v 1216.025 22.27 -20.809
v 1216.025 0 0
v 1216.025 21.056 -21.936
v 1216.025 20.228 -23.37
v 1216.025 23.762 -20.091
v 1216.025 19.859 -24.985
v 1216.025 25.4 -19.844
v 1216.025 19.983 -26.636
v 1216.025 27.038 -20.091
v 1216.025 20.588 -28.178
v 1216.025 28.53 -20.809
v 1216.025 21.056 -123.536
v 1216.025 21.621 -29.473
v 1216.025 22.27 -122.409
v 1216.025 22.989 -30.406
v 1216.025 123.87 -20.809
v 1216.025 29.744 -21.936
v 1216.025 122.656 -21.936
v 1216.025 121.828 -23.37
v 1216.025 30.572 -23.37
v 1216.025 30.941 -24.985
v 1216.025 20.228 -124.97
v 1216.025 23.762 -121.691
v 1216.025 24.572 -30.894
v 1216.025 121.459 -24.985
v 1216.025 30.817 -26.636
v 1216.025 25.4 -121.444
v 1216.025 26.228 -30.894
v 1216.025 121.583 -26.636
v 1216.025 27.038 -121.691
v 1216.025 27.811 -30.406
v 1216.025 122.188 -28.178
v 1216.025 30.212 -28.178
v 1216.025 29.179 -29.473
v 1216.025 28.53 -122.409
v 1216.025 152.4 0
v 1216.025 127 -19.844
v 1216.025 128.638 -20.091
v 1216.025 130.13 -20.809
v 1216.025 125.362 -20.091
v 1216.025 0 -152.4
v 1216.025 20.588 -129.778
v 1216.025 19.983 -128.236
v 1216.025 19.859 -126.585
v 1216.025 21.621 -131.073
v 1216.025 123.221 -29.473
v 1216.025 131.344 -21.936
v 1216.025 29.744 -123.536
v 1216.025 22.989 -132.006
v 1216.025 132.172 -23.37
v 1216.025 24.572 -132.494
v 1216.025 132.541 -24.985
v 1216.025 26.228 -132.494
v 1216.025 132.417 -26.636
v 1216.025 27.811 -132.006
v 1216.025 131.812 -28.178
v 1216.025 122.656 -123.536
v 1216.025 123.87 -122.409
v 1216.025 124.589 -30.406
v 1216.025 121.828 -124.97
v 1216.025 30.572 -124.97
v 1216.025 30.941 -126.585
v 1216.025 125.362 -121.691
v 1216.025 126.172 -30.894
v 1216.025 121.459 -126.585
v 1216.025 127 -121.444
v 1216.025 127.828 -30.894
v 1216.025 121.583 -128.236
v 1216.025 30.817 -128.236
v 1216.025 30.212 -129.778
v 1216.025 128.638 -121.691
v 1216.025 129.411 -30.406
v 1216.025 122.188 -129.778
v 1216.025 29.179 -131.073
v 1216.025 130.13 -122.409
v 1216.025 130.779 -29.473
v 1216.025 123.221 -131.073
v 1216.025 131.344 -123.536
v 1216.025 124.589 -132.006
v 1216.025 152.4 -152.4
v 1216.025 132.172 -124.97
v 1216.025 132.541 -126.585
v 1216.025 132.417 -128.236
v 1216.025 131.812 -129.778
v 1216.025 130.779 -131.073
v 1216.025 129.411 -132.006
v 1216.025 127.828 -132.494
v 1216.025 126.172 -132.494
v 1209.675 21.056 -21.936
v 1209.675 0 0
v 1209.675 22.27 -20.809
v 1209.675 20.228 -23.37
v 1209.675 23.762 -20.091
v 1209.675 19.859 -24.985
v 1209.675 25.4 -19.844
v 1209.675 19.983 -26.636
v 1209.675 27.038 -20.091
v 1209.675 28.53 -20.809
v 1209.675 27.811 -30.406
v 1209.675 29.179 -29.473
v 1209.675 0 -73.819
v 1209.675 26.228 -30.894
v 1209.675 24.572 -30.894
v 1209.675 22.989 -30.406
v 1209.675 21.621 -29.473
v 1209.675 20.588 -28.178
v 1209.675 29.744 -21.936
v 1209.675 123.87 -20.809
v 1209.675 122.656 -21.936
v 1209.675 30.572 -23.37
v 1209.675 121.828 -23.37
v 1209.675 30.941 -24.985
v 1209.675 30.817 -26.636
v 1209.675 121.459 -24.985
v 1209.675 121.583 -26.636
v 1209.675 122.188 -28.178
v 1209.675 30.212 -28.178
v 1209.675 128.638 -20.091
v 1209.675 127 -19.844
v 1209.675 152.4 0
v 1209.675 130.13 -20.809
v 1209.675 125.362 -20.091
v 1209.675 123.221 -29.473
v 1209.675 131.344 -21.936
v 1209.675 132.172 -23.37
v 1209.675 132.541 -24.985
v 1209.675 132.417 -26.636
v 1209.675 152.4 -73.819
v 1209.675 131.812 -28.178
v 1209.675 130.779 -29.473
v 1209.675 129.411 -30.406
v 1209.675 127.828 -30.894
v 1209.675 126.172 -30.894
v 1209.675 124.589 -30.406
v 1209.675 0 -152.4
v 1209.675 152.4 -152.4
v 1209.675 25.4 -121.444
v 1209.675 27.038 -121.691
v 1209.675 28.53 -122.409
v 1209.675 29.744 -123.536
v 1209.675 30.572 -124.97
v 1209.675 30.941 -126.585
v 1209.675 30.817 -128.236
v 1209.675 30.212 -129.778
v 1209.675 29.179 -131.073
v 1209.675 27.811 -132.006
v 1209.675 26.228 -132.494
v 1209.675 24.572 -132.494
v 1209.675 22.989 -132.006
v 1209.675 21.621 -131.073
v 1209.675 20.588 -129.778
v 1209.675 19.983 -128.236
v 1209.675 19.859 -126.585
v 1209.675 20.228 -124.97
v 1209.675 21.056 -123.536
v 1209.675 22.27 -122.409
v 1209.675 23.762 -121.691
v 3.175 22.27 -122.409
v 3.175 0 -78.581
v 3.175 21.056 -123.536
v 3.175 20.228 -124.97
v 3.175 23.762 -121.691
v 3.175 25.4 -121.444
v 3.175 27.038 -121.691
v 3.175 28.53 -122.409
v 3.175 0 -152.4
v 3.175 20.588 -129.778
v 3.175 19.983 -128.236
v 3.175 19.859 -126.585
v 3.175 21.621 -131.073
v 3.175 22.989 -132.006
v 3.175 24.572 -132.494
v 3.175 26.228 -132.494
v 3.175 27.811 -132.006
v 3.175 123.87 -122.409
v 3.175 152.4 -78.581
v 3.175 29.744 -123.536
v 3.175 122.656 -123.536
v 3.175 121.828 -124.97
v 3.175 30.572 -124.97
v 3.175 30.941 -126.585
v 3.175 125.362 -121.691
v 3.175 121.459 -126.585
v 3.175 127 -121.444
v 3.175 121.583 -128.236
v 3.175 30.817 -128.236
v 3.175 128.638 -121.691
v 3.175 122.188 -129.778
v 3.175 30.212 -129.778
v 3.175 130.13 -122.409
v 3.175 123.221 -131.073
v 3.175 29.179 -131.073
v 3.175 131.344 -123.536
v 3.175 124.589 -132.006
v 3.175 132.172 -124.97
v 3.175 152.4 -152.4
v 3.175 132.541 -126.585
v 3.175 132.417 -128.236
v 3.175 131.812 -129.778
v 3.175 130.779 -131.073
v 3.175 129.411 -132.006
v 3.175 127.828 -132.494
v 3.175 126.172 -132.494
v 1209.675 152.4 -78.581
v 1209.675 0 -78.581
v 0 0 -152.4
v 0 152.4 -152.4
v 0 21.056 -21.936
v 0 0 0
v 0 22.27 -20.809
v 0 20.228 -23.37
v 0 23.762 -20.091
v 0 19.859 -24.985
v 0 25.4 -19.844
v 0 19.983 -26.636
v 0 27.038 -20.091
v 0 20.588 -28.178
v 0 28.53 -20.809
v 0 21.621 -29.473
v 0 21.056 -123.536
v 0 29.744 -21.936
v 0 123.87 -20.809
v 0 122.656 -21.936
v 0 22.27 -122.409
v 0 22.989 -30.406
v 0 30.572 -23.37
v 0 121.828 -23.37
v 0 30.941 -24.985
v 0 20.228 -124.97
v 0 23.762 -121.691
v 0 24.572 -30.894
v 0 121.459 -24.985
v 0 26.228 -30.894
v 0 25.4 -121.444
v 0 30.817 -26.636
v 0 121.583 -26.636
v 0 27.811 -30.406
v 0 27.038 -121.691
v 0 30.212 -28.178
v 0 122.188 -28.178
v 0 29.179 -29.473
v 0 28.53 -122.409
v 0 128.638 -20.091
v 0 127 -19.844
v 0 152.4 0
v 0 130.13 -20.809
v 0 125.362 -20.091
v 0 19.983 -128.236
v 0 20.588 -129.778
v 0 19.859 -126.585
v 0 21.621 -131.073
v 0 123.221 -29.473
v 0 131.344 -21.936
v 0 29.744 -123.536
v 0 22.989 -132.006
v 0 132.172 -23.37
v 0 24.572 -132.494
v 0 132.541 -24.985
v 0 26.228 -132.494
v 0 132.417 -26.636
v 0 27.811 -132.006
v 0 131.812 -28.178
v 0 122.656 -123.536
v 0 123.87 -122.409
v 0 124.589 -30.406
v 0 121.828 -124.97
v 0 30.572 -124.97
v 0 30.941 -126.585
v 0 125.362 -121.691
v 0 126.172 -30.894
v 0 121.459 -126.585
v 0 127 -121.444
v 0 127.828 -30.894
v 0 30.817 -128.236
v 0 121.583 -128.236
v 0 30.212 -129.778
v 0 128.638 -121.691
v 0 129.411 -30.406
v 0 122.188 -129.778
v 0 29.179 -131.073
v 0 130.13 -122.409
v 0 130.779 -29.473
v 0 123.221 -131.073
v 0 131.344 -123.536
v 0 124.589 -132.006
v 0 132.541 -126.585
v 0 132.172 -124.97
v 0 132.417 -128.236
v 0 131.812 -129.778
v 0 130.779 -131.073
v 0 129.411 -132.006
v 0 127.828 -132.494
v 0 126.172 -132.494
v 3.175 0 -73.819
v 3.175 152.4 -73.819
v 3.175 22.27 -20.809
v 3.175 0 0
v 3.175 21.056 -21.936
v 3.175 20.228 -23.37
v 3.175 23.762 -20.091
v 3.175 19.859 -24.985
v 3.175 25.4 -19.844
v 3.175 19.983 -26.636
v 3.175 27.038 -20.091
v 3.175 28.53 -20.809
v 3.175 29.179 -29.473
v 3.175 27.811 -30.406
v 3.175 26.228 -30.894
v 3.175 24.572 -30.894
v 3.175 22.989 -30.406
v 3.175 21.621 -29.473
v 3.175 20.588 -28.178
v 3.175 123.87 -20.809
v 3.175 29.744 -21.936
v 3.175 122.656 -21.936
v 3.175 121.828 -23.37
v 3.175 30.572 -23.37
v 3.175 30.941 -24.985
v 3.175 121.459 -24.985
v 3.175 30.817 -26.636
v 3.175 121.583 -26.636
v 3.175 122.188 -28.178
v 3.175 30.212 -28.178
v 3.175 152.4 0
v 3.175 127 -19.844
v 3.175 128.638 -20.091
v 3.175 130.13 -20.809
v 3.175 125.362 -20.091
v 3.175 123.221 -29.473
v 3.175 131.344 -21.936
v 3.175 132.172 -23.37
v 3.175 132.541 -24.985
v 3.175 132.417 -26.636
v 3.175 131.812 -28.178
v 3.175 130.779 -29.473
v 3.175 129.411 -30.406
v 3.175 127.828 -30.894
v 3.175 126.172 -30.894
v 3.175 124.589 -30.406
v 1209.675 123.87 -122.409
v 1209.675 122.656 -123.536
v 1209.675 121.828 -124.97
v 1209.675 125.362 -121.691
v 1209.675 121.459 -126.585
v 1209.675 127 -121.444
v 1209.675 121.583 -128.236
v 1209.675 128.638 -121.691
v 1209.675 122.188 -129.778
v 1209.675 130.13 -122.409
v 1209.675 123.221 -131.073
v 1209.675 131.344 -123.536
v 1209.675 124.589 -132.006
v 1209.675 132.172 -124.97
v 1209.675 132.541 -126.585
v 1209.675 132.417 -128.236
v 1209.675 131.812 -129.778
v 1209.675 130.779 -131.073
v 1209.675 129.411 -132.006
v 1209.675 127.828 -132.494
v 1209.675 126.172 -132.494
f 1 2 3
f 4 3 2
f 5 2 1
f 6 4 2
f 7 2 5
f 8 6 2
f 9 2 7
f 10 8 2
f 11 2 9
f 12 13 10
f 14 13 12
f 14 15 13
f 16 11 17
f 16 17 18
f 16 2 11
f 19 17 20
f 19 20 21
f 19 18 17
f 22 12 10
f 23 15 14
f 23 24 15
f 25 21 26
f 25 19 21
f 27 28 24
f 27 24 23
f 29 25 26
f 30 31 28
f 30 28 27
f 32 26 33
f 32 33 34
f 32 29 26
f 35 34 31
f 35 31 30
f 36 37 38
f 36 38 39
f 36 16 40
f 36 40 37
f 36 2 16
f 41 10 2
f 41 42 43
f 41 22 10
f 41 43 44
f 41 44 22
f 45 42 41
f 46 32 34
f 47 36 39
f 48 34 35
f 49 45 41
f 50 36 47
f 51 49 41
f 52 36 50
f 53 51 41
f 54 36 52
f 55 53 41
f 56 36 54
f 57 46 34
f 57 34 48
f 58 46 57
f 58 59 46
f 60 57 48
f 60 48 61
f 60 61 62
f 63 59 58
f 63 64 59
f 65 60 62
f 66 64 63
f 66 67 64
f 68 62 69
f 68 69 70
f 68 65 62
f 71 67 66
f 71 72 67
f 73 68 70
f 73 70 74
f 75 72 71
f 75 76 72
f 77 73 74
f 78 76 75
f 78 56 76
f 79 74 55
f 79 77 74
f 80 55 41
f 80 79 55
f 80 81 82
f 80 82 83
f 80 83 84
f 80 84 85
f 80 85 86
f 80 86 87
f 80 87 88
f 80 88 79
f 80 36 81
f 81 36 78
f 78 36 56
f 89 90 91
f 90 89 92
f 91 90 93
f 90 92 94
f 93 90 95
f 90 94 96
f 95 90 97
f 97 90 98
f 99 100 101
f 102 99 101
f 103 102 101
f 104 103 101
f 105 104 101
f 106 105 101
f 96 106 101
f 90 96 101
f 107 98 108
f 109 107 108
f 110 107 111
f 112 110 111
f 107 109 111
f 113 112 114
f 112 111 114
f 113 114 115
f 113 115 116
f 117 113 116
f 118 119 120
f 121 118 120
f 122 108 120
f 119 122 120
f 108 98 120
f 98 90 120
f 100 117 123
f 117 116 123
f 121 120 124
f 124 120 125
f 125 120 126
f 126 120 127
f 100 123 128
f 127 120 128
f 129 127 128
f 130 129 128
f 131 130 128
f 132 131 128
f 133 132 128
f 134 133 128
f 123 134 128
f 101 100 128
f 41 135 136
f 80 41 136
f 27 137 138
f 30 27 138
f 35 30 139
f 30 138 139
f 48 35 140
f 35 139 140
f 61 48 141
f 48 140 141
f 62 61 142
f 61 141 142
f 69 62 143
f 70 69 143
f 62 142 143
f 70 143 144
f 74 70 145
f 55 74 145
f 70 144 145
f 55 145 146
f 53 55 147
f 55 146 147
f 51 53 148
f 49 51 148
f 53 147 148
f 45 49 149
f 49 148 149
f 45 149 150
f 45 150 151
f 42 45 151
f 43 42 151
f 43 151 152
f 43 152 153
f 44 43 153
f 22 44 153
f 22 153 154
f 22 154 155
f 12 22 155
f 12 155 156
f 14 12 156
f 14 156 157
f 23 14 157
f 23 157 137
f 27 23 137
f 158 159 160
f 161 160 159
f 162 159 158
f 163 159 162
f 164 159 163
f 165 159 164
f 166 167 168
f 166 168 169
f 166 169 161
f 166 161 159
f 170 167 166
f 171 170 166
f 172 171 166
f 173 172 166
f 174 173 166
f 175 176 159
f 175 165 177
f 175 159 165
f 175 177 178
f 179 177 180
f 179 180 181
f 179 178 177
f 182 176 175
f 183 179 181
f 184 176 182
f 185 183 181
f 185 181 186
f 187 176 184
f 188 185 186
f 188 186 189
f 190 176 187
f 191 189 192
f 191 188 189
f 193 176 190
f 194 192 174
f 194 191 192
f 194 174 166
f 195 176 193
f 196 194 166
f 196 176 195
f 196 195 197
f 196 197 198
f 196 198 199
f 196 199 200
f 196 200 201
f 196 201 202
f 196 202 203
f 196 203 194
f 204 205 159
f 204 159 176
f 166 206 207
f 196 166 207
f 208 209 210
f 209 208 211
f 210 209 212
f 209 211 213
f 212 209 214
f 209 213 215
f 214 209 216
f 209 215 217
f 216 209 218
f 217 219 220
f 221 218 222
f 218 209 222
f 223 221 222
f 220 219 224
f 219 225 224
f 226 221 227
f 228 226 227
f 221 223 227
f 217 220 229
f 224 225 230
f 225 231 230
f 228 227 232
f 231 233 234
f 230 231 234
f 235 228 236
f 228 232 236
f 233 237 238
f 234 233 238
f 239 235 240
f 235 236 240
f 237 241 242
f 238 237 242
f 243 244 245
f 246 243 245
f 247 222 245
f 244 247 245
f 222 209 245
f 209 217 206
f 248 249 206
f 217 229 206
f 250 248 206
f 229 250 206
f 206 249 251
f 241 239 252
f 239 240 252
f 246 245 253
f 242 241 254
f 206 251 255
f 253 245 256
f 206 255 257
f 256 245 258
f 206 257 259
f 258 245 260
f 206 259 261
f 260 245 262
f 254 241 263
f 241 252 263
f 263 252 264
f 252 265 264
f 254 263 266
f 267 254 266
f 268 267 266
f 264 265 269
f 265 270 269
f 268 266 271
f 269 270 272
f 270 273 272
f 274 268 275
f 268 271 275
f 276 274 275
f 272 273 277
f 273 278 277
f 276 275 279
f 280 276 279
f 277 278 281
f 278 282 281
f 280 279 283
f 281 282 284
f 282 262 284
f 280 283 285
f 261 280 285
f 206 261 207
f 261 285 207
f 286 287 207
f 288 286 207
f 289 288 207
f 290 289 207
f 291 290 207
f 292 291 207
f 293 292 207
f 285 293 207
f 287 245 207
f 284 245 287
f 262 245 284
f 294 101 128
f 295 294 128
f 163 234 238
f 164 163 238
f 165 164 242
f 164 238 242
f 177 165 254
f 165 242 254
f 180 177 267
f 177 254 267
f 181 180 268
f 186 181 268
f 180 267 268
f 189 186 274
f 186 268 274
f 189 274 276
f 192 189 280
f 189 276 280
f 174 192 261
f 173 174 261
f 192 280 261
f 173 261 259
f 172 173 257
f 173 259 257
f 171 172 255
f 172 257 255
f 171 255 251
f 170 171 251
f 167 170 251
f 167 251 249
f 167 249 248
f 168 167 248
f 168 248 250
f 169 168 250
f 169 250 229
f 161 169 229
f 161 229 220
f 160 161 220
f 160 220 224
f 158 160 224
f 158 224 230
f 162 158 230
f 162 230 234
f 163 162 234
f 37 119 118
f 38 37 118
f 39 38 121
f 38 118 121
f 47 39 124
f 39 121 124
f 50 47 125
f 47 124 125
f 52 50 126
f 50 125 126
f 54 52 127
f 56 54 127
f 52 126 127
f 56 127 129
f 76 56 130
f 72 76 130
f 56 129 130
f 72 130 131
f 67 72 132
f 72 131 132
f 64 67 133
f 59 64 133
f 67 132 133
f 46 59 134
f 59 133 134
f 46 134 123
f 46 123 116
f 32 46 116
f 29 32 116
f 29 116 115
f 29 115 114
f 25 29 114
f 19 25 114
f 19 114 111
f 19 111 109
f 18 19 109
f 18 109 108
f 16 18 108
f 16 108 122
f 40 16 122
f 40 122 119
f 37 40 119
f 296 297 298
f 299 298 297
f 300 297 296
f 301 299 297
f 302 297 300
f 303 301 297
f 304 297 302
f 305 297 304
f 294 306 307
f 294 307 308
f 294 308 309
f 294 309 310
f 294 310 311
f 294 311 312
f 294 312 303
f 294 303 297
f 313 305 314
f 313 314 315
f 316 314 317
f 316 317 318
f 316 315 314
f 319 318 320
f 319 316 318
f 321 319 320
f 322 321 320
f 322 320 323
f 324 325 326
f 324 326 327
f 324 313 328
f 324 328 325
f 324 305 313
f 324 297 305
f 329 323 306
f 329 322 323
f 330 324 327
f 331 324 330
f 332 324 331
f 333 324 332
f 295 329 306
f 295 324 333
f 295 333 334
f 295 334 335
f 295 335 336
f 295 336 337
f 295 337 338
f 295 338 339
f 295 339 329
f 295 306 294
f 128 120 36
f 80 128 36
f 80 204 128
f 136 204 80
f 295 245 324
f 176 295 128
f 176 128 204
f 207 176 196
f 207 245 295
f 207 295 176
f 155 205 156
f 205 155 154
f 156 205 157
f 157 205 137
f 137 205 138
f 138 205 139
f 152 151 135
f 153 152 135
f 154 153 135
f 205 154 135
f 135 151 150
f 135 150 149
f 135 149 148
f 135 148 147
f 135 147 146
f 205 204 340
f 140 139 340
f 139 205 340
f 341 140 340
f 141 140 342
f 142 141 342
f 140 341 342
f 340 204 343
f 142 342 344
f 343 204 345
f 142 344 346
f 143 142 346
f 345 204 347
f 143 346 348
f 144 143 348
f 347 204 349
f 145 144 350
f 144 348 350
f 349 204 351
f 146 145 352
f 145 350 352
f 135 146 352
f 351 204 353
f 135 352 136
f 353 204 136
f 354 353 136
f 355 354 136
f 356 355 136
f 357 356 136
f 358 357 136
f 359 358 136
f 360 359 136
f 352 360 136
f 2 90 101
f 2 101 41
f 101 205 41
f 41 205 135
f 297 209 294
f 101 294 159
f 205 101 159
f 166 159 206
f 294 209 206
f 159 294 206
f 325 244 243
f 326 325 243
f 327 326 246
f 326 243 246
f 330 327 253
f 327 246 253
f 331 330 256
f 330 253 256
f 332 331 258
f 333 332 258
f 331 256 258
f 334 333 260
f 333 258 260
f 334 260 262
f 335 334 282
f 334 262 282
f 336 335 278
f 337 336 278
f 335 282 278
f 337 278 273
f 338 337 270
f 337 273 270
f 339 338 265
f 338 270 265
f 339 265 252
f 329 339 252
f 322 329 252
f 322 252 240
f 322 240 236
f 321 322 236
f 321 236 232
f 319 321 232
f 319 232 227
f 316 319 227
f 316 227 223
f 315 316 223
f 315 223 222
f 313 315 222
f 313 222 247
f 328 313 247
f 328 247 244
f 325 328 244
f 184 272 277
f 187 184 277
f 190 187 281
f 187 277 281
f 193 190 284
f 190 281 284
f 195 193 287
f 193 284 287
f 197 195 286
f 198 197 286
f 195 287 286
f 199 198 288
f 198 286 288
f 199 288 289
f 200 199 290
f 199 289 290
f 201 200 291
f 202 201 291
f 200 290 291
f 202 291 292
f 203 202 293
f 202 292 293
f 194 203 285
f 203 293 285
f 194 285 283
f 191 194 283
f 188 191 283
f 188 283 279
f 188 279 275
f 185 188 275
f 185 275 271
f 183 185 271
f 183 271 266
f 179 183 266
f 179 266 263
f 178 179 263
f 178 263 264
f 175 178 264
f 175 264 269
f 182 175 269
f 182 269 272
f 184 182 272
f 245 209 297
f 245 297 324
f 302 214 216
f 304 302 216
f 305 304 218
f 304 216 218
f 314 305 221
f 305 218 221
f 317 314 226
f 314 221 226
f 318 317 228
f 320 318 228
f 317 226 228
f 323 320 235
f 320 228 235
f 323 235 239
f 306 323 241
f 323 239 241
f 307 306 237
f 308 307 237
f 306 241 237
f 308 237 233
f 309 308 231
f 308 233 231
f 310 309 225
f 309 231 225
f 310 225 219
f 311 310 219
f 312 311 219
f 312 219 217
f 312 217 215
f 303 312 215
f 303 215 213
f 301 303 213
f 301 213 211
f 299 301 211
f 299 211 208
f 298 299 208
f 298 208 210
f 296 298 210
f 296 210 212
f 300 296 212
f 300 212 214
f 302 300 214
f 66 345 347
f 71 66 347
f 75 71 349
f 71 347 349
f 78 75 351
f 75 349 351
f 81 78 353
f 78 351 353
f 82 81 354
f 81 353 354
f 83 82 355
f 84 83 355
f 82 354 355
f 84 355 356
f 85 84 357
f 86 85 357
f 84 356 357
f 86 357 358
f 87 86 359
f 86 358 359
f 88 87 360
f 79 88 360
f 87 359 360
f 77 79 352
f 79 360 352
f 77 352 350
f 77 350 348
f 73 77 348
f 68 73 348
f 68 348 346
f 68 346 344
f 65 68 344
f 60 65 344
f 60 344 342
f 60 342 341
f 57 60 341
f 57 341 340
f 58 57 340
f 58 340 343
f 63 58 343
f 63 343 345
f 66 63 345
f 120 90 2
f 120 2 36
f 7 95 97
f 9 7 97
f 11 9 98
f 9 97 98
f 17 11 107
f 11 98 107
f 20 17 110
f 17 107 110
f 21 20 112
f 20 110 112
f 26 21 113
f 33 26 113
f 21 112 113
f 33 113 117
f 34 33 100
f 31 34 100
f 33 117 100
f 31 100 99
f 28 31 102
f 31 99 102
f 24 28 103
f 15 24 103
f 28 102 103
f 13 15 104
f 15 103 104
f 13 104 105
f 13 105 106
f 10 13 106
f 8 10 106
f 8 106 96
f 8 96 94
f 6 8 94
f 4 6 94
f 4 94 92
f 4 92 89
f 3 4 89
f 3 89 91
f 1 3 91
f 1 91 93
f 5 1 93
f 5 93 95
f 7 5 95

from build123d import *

# Parameters (mm, degrees)
SKETCH1_W           = 152.4
SKETCH1_H           = 152.4
BOSS_EXTRUDE1_DEPTH = 3.175
SKETCH2_W           = 4.7625
SKETCH2_H           = 152.4
BOSS_EXTRUDE2_DEPTH = 1206.5
SKETCH3_W           = 152.4
SKETCH3_H           = 152.4
BOSS_EXTRUDE3_DEPTH = 6.35
SKETCH4_R           = 5.55625
CUT_EXTRUDE1_DEPTH  = 1219.2


with BuildPart() as part:
    # Sketch1 → Boss-Extrude1 (new body)
    with BuildSketch(Plane(origin=(0, 0, 0), x_dir=(0, 0, -1), z_dir=(1, 0, 0))):
        with Locations((76.2, 76.2)):
            Rectangle(SKETCH1_W, SKETCH1_H)
    extrude(amount=BOSS_EXTRUDE1_DEPTH)

    # Sketch2 → Boss-Extrude2 (add)
    with BuildSketch(Plane(origin=(3.175, 0, 0), x_dir=(0, 0, -1), z_dir=(1, 0, 0))):
        with Locations((76.2, 76.2)):
            Rectangle(SKETCH2_W, SKETCH2_H)
    extrude(amount=BOSS_EXTRUDE2_DEPTH)

    # Sketch3 → Boss-Extrude3 (add)
    with BuildSketch(Plane(origin=(1209.675, 0, 0), x_dir=(0, 0, -1), z_dir=(1, 0, 0))):
        with Locations((76.2, 76.2)):
            Rectangle(SKETCH3_W, SKETCH3_H)
    extrude(amount=BOSS_EXTRUDE3_DEPTH)

    # Sketch4 → Cut-Extrude1 (cut)
    with BuildSketch(Plane.ZY):
        with Locations((-127, 127)):
            Circle(SKETCH4_R)
        with Locations((-25.4, 127)):
            Circle(SKETCH4_R)
        with Locations((-25.4, 25.4)):
            Circle(SKETCH4_R)
        with Locations((-127, 25.4)):
            Circle(SKETCH4_R)
    extrude(amount=-CUT_EXTRUDE1_DEPTH, mode=Mode.SUBTRACT)


solid = part.part
